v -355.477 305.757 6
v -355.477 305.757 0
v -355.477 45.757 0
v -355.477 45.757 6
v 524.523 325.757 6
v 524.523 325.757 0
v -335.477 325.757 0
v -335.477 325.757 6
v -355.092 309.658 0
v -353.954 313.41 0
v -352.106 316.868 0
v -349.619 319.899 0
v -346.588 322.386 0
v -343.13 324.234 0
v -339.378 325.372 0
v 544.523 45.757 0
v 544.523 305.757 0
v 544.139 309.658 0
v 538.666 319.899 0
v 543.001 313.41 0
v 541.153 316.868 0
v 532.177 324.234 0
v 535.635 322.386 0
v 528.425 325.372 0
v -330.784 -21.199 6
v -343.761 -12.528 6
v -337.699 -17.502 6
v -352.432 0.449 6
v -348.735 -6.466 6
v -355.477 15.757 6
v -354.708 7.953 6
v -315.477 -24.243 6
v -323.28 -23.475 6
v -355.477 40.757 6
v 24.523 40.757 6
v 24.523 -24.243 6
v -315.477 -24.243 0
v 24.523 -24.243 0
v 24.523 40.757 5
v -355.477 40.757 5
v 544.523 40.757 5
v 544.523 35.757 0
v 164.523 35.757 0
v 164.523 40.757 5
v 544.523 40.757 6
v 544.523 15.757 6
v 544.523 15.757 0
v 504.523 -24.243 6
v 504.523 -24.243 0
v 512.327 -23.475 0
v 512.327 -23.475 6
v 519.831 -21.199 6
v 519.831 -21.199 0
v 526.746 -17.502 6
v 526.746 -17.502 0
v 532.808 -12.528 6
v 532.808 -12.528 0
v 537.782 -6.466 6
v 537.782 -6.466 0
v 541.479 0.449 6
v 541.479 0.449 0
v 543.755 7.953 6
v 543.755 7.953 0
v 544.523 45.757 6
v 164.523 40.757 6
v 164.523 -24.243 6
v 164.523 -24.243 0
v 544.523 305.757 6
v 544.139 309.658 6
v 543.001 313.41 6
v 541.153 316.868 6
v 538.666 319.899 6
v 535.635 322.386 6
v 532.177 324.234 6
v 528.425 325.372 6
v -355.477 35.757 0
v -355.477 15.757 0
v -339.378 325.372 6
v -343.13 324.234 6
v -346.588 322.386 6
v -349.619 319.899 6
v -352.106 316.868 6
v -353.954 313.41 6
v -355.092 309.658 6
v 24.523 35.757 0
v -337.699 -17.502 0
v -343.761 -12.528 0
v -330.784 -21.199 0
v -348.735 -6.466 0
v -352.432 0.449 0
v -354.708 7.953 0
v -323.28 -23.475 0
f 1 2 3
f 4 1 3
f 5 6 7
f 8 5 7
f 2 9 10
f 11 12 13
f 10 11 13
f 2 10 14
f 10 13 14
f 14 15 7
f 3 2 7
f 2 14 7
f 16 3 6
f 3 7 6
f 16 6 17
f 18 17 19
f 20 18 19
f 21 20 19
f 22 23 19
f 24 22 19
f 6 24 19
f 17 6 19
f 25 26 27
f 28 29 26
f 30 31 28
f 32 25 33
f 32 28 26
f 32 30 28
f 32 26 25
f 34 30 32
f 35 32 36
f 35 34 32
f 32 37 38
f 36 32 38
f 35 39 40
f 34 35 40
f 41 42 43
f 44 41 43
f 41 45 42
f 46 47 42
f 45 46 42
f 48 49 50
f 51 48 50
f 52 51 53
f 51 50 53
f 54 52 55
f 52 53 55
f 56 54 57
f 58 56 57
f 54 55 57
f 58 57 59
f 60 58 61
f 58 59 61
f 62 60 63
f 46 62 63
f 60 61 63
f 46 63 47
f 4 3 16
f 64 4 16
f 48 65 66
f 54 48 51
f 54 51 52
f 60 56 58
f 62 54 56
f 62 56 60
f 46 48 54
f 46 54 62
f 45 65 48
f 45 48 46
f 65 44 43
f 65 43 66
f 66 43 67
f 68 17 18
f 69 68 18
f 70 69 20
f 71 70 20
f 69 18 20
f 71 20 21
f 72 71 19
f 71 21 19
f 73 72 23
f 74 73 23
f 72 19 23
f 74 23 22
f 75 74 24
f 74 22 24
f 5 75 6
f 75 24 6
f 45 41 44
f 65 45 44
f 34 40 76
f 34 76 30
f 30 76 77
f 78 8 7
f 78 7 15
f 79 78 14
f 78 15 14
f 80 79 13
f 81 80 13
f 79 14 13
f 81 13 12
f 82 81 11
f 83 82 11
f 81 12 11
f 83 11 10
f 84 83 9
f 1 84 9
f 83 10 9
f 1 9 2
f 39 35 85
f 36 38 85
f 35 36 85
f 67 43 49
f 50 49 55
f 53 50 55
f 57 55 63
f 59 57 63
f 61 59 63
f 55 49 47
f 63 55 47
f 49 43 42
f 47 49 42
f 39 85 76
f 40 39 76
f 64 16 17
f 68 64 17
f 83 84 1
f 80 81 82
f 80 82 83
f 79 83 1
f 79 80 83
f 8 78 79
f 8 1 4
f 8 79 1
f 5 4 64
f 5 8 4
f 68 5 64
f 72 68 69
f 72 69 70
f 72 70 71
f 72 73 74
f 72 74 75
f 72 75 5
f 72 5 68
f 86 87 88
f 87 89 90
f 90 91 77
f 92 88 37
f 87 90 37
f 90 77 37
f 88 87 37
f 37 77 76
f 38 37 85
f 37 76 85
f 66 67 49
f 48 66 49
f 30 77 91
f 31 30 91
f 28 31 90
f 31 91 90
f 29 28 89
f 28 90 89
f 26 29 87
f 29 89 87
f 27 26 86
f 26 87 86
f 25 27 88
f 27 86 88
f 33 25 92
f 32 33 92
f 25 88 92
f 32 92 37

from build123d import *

# Parameters (mm, degrees)
F1_DEPTH = 6
F2_SIZE  = 5
F3_SIZE  = 5


with BuildPart() as f1:
    # F0 (on Top) → F1 (new body)
    with BuildSketch(Plane.XY):
        with BuildLine():
            Line((94.523475, 325.756645), (-335.476525, 325.756645))
            ThreePointArc((-335.476525, 325.756645), (-349.618661, 319.898781), (-355.476525, 305.756645))
            Line((-355.476525, 305.756645), (-355.476525, 45.756645))
            Line((-355.476525, 45.756645), (-300.793154, 45.756645))
            Line((-300.793154, 45.756645), (94.523475, 45.756645))
            Line((94.523475, 45.756645), (94.523475, 325.756645))
        make_face()
        with BuildLine():
            Line((544.523475, 40.756645), (164.523475, 40.756645))
            Line((164.523475, 40.756645), (164.523475, -24.243355))
            Line((164.523475, -24.243355), (504.523475, -24.243355))
            ThreePointArc((504.523475, -24.243355), (532.807746, -12.527626), (544.523475, 15.756645))
            Line((544.523475, 15.756645), (544.523475, 40.756645))
        make_face()
        with BuildLine():
            Line((24.523475, -24.243355), (24.523475, 40.756645))
            Line((24.523475, 40.756645), (-355.476525, 40.756645))
            Line((-355.476525, 40.756645), (-355.476525, 15.756645))
            ThreePointArc((-355.476525, 15.756645), (-343.760797, -12.527626), (-315.476525, -24.243355))
            Line((-315.476525, -24.243355), (24.523475, -24.243355))
        make_face()
        with BuildLine():
            Line((524.523475, 325.756645), (94.523475, 325.756645))
            Line((94.523475, 325.756645), (94.523475, 45.756645))
            Line((94.523475, 45.756645), (544.523475, 45.756645))
            Line((544.523475, 45.756645), (544.523475, 305.756645))
            ThreePointArc((544.523475, 305.756645), (538.66561, 319.898781), (524.523475, 325.756645))
        make_face()
    extrude(amount=F1_DEPTH)

    # F2
    f2_edges = [f1.edges().sort_by_distance(p)[0] for p in [
        (-165.476525, 40.756645, 0),
    ]]
    chamfer(f2_edges, length=F2_SIZE)

    # F3
    f3_edges = [f1.edges().sort_by_distance(p)[0] for p in [
        (354.523475, 40.756645, 0),
    ]]
    chamfer(f3_edges, length=F3_SIZE)


solid = f1.part
